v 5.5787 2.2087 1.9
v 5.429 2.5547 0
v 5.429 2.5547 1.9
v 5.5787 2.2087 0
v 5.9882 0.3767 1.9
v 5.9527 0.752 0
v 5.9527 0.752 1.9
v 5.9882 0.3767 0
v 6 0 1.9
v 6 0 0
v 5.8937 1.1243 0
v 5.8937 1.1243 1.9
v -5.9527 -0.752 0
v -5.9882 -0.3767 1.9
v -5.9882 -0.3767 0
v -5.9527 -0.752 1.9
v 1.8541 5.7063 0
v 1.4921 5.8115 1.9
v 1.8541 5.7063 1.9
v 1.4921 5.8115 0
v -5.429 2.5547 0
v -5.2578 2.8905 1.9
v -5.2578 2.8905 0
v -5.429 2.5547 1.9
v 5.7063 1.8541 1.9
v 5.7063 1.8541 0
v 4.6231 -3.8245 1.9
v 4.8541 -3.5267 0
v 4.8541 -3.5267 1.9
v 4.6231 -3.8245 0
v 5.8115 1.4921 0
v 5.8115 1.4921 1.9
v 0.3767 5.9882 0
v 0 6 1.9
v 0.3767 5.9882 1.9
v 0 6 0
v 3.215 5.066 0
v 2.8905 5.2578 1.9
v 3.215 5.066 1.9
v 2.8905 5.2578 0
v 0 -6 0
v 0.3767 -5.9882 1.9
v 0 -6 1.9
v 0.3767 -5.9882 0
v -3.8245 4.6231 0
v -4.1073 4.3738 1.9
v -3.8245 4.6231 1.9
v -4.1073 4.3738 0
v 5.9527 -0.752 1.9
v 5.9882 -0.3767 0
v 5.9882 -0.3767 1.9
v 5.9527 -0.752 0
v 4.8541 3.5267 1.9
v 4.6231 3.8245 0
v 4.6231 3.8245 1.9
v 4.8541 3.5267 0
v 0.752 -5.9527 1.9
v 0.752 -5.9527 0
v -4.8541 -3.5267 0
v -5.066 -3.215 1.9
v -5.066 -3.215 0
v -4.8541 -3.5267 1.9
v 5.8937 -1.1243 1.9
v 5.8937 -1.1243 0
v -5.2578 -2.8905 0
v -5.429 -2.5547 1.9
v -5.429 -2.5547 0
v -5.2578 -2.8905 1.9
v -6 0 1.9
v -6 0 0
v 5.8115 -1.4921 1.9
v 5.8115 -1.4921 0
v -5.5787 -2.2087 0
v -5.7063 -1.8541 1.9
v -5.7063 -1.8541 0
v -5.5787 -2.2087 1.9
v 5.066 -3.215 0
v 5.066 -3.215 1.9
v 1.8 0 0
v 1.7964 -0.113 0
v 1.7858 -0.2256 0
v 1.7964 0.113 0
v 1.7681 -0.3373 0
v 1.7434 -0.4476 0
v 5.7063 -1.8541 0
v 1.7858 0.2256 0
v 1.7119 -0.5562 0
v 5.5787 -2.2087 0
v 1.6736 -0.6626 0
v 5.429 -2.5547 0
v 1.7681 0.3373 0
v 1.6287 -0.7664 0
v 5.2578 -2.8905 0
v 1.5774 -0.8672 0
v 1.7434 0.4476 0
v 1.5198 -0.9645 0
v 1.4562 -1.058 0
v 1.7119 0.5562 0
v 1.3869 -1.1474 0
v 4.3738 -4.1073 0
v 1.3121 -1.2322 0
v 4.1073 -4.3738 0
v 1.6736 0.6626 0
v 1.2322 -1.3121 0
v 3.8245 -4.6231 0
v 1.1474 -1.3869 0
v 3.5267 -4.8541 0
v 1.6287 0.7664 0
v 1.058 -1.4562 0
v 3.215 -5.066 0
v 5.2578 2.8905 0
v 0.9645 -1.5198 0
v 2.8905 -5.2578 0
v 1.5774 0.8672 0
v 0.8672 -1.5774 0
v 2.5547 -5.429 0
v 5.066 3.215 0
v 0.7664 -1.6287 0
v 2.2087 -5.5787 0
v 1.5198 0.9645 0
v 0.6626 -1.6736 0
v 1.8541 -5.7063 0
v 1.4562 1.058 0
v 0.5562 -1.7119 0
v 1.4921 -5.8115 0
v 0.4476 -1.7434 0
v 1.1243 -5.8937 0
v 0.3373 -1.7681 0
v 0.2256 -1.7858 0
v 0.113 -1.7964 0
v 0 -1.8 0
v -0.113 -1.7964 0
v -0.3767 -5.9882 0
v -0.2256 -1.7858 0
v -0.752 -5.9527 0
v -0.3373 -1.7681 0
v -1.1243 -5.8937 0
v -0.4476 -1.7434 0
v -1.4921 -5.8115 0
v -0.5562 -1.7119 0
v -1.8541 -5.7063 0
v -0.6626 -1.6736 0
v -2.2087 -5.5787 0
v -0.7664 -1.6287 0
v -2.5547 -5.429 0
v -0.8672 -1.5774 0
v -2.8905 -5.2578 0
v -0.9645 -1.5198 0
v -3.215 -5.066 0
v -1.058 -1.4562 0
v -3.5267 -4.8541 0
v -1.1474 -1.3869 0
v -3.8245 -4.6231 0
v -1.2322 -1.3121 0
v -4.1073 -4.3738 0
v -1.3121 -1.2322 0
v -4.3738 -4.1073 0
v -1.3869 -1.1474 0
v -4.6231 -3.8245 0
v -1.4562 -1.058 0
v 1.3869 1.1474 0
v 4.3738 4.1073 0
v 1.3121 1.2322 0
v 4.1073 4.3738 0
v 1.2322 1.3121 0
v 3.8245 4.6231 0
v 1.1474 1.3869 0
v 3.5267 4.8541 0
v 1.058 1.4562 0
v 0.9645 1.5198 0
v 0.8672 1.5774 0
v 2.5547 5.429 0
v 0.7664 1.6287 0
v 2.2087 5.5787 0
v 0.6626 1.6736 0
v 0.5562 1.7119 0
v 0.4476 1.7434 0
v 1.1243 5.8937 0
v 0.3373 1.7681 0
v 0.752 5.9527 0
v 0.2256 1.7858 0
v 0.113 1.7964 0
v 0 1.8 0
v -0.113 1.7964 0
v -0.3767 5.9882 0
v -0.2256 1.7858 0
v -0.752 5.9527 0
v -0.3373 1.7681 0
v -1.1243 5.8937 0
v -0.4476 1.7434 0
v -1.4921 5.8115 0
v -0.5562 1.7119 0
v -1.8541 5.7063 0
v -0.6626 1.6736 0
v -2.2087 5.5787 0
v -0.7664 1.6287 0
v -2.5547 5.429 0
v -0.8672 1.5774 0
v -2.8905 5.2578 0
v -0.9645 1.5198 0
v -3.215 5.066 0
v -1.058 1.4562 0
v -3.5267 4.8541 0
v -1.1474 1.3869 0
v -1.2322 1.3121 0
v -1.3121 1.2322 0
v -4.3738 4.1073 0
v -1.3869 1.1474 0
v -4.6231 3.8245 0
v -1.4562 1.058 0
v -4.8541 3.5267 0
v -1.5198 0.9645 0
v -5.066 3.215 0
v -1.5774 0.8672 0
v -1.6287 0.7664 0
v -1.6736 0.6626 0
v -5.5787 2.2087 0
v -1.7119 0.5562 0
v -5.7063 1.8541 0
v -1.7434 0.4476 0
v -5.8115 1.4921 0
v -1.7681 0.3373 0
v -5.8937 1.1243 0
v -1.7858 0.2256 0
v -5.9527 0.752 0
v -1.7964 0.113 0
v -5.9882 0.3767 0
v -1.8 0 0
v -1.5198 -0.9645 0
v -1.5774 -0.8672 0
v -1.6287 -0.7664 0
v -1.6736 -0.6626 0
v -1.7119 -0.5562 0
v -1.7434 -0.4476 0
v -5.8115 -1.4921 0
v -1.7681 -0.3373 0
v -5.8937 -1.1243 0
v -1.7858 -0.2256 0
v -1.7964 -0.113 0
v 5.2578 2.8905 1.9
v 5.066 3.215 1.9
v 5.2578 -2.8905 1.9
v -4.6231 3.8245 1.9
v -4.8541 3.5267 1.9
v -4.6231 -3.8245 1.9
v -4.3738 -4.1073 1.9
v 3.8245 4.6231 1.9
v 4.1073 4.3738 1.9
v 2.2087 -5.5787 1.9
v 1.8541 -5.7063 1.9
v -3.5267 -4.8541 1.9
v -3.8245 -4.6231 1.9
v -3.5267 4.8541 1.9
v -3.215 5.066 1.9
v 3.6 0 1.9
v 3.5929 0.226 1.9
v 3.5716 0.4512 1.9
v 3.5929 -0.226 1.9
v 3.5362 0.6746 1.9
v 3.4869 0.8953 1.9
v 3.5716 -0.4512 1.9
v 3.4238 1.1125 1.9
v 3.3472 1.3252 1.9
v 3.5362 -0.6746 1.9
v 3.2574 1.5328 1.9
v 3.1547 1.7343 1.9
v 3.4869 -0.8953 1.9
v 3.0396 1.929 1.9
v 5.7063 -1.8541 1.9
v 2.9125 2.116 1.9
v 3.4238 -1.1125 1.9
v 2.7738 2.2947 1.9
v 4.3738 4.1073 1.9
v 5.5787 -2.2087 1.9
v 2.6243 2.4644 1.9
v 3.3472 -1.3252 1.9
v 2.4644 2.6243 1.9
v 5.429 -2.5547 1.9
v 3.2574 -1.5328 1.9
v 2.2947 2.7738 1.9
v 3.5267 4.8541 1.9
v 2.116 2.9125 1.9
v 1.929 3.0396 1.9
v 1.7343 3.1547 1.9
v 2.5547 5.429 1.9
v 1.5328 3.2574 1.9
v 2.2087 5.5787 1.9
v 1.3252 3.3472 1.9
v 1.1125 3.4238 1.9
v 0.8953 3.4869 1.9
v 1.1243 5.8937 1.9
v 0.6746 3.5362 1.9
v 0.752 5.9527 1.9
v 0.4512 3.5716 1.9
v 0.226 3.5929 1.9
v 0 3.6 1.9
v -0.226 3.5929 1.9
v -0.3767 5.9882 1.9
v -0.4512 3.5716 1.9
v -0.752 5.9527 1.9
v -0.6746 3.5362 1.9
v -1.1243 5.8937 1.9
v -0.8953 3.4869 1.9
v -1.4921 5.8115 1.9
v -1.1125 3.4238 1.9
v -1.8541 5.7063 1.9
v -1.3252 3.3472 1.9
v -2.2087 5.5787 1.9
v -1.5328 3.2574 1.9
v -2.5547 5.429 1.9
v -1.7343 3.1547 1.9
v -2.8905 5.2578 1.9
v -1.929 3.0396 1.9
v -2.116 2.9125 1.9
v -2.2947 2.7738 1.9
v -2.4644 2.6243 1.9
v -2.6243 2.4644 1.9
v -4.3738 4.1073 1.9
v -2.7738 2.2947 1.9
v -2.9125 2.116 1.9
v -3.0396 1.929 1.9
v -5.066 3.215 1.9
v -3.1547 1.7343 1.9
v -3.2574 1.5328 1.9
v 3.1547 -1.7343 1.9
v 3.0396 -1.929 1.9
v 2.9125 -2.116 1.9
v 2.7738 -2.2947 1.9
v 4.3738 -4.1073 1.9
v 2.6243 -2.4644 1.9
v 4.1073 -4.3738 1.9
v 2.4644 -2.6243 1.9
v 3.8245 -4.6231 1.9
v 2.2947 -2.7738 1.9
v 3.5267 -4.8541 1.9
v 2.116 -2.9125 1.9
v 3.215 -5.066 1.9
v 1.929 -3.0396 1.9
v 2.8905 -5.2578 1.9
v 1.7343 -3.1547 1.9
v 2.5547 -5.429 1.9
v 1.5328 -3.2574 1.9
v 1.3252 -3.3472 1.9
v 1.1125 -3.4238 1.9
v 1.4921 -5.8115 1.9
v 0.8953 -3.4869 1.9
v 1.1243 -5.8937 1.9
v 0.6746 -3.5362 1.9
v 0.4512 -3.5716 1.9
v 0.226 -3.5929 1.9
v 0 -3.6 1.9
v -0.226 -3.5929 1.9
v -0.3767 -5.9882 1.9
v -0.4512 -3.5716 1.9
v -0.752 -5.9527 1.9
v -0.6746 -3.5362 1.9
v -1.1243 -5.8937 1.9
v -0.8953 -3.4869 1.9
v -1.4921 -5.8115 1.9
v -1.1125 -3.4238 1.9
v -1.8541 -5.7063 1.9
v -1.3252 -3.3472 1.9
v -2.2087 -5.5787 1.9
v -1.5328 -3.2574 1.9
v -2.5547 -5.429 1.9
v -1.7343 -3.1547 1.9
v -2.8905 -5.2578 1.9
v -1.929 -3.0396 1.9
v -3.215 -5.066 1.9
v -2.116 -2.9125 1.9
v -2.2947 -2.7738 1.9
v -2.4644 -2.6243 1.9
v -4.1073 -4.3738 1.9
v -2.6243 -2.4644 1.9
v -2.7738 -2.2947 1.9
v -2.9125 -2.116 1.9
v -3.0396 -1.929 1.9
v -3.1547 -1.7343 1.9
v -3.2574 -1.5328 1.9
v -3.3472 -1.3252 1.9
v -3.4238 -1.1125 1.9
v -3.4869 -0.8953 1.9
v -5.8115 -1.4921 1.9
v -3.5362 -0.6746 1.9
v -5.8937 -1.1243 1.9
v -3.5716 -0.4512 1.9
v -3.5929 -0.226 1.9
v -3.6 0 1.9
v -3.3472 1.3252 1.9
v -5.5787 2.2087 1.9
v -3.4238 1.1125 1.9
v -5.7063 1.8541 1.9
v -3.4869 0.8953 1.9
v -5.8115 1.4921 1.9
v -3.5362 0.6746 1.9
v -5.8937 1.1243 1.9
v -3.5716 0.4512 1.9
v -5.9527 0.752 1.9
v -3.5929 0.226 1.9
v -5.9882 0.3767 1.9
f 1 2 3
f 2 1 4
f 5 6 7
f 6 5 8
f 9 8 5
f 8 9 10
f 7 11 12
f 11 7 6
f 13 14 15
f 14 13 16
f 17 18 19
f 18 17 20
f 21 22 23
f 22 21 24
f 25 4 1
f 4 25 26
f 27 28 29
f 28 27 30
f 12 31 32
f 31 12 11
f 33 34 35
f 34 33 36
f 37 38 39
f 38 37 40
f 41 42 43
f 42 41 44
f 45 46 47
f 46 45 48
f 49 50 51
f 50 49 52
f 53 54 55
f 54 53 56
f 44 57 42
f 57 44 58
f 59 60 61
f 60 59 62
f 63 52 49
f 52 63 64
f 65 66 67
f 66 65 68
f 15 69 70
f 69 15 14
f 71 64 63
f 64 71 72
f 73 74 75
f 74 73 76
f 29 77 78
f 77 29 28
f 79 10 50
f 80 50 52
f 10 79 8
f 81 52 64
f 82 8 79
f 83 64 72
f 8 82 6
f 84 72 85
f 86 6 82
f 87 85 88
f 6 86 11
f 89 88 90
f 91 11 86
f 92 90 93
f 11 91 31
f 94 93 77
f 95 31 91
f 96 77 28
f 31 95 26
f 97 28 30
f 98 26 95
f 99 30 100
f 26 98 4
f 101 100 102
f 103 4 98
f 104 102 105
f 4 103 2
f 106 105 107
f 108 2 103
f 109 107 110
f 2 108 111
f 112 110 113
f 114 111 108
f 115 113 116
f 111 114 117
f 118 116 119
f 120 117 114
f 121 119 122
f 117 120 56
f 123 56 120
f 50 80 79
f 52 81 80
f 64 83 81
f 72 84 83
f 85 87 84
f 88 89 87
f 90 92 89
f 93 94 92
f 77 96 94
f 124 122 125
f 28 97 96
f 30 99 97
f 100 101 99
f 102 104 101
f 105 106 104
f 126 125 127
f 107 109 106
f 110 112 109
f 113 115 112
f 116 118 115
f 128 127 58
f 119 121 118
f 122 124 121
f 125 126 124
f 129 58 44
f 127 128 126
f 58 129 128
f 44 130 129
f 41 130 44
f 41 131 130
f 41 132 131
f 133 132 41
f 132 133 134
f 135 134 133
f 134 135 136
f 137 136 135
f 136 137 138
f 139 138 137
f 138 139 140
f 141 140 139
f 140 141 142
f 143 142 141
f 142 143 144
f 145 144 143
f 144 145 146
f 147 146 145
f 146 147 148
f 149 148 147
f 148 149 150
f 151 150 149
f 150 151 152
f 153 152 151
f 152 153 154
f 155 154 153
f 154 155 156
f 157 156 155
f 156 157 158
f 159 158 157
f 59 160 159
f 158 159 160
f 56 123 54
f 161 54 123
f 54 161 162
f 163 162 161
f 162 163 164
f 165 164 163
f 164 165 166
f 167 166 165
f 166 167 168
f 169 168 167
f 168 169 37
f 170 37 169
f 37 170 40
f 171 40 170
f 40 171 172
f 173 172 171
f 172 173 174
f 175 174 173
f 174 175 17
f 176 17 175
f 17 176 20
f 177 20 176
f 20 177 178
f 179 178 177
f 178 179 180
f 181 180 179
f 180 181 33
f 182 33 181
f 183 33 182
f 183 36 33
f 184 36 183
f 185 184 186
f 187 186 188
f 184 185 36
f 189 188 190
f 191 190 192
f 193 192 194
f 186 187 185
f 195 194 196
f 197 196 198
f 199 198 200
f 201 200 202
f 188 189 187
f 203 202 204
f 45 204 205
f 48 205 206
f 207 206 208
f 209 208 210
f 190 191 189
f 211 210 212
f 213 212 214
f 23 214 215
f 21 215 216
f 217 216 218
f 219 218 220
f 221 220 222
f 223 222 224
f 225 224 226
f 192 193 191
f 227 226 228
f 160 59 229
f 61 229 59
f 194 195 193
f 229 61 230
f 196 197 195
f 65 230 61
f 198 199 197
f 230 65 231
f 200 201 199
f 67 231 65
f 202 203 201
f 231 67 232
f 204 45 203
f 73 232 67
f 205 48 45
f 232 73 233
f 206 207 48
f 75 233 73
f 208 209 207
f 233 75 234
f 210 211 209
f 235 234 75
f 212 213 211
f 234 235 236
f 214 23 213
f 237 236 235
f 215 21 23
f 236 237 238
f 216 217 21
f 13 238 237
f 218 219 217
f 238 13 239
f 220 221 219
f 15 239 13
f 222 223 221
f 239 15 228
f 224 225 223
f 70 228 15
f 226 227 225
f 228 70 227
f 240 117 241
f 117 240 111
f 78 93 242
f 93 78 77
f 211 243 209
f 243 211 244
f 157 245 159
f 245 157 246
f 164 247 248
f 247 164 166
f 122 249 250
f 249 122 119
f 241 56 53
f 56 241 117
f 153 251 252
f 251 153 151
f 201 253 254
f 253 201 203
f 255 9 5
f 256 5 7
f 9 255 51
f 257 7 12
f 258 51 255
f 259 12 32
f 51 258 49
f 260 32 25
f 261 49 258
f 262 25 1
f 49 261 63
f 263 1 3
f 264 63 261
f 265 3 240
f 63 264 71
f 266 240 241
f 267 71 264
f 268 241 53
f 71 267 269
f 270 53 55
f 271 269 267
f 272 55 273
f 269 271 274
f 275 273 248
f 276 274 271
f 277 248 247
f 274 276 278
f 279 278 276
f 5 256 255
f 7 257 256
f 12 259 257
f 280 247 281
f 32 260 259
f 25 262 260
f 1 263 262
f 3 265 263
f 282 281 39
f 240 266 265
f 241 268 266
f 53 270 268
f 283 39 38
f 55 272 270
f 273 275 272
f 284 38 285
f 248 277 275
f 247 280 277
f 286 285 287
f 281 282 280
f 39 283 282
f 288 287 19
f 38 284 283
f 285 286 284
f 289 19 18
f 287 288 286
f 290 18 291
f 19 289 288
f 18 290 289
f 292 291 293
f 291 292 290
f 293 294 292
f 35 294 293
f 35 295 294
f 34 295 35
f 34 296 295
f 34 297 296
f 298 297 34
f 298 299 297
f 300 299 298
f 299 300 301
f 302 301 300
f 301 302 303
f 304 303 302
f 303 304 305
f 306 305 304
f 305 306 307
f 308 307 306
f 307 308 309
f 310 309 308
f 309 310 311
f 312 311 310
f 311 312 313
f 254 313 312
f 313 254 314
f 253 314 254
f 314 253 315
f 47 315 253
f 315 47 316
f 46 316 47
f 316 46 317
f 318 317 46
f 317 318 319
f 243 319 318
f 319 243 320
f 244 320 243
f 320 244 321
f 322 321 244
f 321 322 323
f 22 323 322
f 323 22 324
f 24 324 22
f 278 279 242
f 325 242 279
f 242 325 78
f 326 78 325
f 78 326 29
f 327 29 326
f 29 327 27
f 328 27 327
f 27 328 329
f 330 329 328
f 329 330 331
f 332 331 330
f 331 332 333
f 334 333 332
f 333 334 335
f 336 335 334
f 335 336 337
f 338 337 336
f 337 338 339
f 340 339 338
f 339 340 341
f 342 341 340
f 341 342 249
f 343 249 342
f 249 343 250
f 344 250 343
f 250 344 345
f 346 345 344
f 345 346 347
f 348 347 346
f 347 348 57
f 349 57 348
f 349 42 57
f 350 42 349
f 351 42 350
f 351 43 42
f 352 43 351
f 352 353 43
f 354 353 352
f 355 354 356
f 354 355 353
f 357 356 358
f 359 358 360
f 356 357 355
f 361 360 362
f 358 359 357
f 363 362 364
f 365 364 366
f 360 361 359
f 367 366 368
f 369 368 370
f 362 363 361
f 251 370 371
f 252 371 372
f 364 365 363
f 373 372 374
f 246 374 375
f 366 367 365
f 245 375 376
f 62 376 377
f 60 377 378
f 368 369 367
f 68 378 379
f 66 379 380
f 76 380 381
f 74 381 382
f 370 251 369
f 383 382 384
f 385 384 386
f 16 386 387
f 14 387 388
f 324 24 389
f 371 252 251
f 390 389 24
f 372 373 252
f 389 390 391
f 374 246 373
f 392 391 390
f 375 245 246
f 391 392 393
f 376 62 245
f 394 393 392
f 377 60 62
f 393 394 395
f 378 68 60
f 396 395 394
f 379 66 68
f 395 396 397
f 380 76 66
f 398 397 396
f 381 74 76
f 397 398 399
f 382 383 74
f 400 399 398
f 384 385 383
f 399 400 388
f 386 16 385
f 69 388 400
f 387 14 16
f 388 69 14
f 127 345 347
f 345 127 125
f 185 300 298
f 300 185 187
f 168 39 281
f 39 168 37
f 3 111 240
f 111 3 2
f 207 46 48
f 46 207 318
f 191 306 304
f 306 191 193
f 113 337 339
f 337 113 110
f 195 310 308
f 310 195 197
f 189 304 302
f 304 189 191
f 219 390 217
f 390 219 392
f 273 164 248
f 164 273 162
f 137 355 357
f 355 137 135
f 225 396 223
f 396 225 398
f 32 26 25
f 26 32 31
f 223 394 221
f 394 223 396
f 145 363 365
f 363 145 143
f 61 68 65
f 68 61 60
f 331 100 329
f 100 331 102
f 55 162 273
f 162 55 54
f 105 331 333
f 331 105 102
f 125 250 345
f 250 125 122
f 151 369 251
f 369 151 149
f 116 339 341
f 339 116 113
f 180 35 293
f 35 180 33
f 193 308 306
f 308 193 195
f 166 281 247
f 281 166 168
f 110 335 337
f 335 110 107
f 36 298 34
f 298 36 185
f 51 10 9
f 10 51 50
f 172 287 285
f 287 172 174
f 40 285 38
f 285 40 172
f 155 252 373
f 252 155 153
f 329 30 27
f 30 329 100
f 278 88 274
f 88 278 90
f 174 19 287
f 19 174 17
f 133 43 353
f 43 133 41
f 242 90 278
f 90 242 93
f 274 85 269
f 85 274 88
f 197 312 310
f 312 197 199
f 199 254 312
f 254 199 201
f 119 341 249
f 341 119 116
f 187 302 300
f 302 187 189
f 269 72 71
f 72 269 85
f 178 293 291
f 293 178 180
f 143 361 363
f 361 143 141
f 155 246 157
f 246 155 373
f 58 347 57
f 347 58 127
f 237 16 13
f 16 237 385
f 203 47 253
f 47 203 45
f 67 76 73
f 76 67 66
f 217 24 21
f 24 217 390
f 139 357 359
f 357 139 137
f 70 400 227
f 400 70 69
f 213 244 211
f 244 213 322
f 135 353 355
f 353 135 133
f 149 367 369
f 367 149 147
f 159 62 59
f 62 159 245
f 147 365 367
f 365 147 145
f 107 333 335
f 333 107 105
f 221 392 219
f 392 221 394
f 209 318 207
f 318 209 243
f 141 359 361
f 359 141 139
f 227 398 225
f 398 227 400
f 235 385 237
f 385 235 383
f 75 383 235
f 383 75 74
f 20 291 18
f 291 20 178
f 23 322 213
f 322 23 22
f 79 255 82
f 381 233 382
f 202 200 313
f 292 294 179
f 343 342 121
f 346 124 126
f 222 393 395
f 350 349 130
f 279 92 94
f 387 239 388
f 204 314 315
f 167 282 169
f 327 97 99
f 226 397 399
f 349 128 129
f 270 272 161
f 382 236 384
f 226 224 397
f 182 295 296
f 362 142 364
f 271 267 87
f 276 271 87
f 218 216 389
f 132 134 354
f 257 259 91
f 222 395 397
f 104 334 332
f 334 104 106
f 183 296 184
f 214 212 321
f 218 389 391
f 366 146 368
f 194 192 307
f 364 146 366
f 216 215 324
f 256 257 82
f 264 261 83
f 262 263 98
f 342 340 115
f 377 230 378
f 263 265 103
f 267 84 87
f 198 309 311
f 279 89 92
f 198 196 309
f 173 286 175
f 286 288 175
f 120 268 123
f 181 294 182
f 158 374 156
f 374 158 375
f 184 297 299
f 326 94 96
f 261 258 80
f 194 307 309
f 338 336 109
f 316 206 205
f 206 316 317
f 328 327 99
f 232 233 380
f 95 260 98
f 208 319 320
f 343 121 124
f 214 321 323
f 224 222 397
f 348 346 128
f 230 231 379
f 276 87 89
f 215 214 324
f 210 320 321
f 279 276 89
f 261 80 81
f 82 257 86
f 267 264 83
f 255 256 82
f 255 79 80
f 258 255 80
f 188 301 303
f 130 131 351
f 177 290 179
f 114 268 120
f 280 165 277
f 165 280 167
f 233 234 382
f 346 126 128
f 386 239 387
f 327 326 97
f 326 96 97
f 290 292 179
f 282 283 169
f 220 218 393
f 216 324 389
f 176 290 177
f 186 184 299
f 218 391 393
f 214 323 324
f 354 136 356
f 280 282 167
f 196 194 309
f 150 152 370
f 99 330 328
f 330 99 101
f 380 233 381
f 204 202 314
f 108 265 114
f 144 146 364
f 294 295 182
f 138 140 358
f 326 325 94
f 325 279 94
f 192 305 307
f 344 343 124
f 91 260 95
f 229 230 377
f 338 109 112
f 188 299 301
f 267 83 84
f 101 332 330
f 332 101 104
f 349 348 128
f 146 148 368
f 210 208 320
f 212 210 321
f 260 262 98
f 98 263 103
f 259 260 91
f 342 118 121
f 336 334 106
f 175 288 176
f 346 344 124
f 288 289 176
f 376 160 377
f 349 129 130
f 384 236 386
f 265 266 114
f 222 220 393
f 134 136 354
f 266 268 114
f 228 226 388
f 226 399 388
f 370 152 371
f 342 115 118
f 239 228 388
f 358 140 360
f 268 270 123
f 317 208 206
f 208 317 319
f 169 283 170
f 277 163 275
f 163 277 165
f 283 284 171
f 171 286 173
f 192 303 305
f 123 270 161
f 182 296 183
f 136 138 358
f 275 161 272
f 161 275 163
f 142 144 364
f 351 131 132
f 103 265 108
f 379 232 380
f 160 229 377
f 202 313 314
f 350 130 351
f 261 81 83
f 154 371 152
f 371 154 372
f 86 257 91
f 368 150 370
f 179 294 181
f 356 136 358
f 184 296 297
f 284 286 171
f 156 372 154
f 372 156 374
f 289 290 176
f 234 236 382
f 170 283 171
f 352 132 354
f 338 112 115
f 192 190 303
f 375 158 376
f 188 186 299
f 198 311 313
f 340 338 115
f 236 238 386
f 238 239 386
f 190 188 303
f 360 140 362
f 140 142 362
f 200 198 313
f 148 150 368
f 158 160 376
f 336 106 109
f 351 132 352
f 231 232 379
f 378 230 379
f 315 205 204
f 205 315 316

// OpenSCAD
$fn = 100;

difference() {
    cylinder(h=1.9, d=12);
    translate([0, 0, 0])
        cylinder(h=1.9, r1=1.8, r2=3.6);
    translate([0, 0, -1])
        cylinder(h=3.9, r=1.8);
}
